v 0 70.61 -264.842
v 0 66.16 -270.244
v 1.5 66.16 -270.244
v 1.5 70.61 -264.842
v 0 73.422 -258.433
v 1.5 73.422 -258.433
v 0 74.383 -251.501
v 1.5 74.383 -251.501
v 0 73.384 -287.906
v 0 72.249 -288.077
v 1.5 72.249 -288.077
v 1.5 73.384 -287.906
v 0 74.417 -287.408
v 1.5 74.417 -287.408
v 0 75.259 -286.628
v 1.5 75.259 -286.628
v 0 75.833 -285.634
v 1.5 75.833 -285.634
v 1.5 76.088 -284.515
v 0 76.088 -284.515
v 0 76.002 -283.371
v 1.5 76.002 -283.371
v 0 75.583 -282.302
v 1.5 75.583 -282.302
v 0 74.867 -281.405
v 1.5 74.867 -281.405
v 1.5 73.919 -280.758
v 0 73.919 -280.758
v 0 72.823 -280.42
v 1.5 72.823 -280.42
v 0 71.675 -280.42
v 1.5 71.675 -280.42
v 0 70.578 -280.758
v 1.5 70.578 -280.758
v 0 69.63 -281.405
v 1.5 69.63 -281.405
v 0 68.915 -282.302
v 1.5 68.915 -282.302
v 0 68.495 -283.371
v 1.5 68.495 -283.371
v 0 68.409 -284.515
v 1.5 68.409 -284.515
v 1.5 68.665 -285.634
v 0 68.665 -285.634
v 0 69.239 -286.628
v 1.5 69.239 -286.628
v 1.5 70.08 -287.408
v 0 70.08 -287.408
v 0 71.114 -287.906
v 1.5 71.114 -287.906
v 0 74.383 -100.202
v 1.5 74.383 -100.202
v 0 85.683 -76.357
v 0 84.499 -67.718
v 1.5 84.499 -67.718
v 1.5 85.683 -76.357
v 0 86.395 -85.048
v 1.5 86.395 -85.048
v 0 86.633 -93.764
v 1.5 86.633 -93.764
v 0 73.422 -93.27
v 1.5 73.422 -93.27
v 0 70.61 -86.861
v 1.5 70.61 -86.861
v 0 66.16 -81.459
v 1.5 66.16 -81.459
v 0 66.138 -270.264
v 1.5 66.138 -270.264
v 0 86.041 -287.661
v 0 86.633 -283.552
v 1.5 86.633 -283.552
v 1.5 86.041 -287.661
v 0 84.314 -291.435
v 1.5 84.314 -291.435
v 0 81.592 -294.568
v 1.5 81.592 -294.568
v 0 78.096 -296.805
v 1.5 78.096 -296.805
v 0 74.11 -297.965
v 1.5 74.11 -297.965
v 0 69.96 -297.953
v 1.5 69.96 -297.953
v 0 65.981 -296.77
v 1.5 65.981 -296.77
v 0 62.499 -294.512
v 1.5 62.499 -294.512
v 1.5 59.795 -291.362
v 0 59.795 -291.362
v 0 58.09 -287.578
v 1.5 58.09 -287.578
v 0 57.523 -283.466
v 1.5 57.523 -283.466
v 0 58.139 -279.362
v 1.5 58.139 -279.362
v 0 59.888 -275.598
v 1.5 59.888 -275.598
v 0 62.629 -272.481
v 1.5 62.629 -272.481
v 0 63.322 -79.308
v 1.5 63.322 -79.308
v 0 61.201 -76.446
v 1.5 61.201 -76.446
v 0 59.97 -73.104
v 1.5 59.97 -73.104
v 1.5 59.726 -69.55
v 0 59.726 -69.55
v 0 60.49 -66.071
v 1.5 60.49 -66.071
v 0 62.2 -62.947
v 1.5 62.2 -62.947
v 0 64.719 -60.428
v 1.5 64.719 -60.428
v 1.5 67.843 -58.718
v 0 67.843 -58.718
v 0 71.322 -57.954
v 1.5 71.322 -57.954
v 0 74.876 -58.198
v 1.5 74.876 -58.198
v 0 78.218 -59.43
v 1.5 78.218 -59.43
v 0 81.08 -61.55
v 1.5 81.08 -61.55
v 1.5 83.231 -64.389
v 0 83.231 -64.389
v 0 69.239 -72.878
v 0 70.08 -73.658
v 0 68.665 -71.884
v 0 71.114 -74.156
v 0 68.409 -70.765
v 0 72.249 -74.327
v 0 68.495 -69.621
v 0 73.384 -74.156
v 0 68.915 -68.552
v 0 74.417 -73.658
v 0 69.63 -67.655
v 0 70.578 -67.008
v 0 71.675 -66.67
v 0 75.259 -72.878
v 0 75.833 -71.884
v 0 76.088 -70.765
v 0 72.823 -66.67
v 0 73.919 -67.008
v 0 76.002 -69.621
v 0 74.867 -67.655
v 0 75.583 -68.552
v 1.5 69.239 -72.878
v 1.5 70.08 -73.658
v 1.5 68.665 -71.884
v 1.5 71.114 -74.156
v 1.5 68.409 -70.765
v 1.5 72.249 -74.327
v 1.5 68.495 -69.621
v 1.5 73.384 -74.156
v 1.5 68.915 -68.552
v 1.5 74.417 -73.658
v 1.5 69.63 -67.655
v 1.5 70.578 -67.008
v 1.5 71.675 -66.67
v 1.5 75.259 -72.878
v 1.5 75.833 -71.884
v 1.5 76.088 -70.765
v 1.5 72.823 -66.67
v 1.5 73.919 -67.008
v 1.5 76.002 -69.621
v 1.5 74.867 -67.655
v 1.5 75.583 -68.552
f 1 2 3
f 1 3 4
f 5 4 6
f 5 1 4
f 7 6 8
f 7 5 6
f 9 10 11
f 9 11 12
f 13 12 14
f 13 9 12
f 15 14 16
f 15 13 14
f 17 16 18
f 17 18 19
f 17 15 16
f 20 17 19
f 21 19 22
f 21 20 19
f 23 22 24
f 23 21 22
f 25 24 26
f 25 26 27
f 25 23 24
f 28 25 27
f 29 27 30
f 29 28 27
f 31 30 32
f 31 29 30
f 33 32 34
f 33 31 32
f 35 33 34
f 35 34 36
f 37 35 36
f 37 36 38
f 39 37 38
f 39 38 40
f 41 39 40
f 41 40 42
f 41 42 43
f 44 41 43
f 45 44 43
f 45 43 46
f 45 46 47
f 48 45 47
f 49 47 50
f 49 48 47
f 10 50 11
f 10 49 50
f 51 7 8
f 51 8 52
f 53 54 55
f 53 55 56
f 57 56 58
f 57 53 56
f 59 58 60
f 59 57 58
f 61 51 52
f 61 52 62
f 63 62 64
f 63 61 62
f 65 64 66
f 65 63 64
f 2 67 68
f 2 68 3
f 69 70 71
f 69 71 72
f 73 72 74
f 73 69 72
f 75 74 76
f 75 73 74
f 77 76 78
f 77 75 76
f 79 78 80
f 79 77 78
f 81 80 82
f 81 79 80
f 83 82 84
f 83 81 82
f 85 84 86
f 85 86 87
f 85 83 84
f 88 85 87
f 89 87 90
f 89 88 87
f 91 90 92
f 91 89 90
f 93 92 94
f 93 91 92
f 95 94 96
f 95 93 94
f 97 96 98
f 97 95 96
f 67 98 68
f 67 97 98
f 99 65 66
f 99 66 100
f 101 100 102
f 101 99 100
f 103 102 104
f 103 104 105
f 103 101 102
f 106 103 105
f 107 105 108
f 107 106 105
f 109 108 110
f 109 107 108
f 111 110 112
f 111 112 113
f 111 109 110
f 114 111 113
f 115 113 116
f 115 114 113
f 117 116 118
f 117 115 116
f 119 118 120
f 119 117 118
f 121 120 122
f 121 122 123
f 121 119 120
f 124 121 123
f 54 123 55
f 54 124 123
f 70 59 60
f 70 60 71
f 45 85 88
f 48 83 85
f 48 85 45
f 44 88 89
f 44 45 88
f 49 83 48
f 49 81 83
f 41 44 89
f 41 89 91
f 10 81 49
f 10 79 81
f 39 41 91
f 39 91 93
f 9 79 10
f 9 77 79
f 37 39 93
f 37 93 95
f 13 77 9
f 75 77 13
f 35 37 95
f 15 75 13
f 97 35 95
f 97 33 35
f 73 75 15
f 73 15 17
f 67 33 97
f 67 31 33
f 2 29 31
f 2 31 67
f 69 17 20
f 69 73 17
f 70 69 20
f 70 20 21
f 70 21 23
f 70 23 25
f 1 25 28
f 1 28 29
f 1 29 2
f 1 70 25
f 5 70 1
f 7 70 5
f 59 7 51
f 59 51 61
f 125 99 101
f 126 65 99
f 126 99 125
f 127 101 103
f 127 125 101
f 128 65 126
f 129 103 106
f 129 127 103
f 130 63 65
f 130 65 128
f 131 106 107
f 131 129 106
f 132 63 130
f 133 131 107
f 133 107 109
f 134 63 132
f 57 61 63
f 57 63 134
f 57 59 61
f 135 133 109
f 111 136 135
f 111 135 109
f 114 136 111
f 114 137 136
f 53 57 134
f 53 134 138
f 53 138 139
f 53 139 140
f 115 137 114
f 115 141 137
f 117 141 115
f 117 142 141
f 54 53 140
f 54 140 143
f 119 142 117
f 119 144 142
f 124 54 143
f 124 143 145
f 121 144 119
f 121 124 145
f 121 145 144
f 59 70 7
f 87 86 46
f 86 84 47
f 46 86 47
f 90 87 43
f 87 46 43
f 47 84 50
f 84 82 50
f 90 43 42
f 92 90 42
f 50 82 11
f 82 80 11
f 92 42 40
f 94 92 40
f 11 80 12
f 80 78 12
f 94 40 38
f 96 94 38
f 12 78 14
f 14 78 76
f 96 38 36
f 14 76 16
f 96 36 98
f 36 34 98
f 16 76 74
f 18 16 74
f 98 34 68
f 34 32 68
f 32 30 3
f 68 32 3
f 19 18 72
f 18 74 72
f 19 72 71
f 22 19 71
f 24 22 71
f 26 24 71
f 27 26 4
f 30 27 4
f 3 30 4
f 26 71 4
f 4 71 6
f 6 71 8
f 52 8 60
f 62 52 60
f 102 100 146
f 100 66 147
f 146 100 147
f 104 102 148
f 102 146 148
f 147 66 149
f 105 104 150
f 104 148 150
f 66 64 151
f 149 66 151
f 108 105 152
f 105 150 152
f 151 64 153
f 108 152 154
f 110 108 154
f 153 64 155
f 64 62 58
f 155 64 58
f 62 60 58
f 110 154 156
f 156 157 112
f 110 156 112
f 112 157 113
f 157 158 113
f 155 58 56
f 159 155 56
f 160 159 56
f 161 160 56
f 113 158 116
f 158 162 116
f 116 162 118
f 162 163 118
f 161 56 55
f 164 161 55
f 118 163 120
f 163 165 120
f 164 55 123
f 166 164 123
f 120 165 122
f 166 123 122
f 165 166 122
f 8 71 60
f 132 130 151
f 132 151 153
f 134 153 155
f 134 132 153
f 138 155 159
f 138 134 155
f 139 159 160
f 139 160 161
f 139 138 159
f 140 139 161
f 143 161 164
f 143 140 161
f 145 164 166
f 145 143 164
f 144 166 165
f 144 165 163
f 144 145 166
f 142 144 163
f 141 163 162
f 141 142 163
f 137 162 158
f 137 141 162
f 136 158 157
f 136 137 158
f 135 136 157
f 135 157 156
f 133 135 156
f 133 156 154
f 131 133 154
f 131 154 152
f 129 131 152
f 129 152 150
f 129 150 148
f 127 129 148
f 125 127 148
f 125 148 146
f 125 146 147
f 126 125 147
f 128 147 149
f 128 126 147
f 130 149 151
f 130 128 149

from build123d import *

# Parameters (mm, degrees)
SKETCH_1_R      = 3.85
EXTRUDE_1_DEPTH = 1.5


with BuildPart() as part:
    # 草圖1 → 填料-伸長1 (new body)
    with BuildSketch(Plane(origin=(0, 0, 0), x_dir=(0, 0, -1), z_dir=(1, 0, 0))):
        with BuildLine():
            Line((251.501318297, 74.382976373), (100.201901366, 74.382976373))
            ThreePointArc((100.201901366, 74.382976373), (89.968438713, 72.236892378), (81.459379698, 66.160269216))
            ThreePointArc((81.459379698, 66.160269216), (60.428444362, 64.718846971), (67.717817707, 84.498709848))
            ThreePointArc((67.717817707, 84.498709848), (80.697411325, 86.098517108), (93.764300282, 86.632976373))
            Line((93.764300282, 86.632976373), (249.095497945, 86.632976373))
            Line((249.095497945, 86.632976373), (283.552477777, 86.632976373))
            ThreePointArc((283.552477777, 86.632976373), (295.765347138, 64.159226657), (270.264218528, 66.138126331))
            Line((270.264218528, 66.138126331), (270.243839965, 66.160269216))
            ThreePointArc((270.243839965, 66.160269216), (261.734780949, 72.236892378), (251.501318297, 74.382976373))
        make_face()
        with Locations((70.477225092, 72.248709848)):
            Circle(SKETCH_1_R, mode=Mode.SUBTRACT)
        with Locations((284.227225092, 72.248709848)):
            Circle(SKETCH_1_R, mode=Mode.SUBTRACT)
    extrude(amount=EXTRUDE_1_DEPTH)


solid = part.part
